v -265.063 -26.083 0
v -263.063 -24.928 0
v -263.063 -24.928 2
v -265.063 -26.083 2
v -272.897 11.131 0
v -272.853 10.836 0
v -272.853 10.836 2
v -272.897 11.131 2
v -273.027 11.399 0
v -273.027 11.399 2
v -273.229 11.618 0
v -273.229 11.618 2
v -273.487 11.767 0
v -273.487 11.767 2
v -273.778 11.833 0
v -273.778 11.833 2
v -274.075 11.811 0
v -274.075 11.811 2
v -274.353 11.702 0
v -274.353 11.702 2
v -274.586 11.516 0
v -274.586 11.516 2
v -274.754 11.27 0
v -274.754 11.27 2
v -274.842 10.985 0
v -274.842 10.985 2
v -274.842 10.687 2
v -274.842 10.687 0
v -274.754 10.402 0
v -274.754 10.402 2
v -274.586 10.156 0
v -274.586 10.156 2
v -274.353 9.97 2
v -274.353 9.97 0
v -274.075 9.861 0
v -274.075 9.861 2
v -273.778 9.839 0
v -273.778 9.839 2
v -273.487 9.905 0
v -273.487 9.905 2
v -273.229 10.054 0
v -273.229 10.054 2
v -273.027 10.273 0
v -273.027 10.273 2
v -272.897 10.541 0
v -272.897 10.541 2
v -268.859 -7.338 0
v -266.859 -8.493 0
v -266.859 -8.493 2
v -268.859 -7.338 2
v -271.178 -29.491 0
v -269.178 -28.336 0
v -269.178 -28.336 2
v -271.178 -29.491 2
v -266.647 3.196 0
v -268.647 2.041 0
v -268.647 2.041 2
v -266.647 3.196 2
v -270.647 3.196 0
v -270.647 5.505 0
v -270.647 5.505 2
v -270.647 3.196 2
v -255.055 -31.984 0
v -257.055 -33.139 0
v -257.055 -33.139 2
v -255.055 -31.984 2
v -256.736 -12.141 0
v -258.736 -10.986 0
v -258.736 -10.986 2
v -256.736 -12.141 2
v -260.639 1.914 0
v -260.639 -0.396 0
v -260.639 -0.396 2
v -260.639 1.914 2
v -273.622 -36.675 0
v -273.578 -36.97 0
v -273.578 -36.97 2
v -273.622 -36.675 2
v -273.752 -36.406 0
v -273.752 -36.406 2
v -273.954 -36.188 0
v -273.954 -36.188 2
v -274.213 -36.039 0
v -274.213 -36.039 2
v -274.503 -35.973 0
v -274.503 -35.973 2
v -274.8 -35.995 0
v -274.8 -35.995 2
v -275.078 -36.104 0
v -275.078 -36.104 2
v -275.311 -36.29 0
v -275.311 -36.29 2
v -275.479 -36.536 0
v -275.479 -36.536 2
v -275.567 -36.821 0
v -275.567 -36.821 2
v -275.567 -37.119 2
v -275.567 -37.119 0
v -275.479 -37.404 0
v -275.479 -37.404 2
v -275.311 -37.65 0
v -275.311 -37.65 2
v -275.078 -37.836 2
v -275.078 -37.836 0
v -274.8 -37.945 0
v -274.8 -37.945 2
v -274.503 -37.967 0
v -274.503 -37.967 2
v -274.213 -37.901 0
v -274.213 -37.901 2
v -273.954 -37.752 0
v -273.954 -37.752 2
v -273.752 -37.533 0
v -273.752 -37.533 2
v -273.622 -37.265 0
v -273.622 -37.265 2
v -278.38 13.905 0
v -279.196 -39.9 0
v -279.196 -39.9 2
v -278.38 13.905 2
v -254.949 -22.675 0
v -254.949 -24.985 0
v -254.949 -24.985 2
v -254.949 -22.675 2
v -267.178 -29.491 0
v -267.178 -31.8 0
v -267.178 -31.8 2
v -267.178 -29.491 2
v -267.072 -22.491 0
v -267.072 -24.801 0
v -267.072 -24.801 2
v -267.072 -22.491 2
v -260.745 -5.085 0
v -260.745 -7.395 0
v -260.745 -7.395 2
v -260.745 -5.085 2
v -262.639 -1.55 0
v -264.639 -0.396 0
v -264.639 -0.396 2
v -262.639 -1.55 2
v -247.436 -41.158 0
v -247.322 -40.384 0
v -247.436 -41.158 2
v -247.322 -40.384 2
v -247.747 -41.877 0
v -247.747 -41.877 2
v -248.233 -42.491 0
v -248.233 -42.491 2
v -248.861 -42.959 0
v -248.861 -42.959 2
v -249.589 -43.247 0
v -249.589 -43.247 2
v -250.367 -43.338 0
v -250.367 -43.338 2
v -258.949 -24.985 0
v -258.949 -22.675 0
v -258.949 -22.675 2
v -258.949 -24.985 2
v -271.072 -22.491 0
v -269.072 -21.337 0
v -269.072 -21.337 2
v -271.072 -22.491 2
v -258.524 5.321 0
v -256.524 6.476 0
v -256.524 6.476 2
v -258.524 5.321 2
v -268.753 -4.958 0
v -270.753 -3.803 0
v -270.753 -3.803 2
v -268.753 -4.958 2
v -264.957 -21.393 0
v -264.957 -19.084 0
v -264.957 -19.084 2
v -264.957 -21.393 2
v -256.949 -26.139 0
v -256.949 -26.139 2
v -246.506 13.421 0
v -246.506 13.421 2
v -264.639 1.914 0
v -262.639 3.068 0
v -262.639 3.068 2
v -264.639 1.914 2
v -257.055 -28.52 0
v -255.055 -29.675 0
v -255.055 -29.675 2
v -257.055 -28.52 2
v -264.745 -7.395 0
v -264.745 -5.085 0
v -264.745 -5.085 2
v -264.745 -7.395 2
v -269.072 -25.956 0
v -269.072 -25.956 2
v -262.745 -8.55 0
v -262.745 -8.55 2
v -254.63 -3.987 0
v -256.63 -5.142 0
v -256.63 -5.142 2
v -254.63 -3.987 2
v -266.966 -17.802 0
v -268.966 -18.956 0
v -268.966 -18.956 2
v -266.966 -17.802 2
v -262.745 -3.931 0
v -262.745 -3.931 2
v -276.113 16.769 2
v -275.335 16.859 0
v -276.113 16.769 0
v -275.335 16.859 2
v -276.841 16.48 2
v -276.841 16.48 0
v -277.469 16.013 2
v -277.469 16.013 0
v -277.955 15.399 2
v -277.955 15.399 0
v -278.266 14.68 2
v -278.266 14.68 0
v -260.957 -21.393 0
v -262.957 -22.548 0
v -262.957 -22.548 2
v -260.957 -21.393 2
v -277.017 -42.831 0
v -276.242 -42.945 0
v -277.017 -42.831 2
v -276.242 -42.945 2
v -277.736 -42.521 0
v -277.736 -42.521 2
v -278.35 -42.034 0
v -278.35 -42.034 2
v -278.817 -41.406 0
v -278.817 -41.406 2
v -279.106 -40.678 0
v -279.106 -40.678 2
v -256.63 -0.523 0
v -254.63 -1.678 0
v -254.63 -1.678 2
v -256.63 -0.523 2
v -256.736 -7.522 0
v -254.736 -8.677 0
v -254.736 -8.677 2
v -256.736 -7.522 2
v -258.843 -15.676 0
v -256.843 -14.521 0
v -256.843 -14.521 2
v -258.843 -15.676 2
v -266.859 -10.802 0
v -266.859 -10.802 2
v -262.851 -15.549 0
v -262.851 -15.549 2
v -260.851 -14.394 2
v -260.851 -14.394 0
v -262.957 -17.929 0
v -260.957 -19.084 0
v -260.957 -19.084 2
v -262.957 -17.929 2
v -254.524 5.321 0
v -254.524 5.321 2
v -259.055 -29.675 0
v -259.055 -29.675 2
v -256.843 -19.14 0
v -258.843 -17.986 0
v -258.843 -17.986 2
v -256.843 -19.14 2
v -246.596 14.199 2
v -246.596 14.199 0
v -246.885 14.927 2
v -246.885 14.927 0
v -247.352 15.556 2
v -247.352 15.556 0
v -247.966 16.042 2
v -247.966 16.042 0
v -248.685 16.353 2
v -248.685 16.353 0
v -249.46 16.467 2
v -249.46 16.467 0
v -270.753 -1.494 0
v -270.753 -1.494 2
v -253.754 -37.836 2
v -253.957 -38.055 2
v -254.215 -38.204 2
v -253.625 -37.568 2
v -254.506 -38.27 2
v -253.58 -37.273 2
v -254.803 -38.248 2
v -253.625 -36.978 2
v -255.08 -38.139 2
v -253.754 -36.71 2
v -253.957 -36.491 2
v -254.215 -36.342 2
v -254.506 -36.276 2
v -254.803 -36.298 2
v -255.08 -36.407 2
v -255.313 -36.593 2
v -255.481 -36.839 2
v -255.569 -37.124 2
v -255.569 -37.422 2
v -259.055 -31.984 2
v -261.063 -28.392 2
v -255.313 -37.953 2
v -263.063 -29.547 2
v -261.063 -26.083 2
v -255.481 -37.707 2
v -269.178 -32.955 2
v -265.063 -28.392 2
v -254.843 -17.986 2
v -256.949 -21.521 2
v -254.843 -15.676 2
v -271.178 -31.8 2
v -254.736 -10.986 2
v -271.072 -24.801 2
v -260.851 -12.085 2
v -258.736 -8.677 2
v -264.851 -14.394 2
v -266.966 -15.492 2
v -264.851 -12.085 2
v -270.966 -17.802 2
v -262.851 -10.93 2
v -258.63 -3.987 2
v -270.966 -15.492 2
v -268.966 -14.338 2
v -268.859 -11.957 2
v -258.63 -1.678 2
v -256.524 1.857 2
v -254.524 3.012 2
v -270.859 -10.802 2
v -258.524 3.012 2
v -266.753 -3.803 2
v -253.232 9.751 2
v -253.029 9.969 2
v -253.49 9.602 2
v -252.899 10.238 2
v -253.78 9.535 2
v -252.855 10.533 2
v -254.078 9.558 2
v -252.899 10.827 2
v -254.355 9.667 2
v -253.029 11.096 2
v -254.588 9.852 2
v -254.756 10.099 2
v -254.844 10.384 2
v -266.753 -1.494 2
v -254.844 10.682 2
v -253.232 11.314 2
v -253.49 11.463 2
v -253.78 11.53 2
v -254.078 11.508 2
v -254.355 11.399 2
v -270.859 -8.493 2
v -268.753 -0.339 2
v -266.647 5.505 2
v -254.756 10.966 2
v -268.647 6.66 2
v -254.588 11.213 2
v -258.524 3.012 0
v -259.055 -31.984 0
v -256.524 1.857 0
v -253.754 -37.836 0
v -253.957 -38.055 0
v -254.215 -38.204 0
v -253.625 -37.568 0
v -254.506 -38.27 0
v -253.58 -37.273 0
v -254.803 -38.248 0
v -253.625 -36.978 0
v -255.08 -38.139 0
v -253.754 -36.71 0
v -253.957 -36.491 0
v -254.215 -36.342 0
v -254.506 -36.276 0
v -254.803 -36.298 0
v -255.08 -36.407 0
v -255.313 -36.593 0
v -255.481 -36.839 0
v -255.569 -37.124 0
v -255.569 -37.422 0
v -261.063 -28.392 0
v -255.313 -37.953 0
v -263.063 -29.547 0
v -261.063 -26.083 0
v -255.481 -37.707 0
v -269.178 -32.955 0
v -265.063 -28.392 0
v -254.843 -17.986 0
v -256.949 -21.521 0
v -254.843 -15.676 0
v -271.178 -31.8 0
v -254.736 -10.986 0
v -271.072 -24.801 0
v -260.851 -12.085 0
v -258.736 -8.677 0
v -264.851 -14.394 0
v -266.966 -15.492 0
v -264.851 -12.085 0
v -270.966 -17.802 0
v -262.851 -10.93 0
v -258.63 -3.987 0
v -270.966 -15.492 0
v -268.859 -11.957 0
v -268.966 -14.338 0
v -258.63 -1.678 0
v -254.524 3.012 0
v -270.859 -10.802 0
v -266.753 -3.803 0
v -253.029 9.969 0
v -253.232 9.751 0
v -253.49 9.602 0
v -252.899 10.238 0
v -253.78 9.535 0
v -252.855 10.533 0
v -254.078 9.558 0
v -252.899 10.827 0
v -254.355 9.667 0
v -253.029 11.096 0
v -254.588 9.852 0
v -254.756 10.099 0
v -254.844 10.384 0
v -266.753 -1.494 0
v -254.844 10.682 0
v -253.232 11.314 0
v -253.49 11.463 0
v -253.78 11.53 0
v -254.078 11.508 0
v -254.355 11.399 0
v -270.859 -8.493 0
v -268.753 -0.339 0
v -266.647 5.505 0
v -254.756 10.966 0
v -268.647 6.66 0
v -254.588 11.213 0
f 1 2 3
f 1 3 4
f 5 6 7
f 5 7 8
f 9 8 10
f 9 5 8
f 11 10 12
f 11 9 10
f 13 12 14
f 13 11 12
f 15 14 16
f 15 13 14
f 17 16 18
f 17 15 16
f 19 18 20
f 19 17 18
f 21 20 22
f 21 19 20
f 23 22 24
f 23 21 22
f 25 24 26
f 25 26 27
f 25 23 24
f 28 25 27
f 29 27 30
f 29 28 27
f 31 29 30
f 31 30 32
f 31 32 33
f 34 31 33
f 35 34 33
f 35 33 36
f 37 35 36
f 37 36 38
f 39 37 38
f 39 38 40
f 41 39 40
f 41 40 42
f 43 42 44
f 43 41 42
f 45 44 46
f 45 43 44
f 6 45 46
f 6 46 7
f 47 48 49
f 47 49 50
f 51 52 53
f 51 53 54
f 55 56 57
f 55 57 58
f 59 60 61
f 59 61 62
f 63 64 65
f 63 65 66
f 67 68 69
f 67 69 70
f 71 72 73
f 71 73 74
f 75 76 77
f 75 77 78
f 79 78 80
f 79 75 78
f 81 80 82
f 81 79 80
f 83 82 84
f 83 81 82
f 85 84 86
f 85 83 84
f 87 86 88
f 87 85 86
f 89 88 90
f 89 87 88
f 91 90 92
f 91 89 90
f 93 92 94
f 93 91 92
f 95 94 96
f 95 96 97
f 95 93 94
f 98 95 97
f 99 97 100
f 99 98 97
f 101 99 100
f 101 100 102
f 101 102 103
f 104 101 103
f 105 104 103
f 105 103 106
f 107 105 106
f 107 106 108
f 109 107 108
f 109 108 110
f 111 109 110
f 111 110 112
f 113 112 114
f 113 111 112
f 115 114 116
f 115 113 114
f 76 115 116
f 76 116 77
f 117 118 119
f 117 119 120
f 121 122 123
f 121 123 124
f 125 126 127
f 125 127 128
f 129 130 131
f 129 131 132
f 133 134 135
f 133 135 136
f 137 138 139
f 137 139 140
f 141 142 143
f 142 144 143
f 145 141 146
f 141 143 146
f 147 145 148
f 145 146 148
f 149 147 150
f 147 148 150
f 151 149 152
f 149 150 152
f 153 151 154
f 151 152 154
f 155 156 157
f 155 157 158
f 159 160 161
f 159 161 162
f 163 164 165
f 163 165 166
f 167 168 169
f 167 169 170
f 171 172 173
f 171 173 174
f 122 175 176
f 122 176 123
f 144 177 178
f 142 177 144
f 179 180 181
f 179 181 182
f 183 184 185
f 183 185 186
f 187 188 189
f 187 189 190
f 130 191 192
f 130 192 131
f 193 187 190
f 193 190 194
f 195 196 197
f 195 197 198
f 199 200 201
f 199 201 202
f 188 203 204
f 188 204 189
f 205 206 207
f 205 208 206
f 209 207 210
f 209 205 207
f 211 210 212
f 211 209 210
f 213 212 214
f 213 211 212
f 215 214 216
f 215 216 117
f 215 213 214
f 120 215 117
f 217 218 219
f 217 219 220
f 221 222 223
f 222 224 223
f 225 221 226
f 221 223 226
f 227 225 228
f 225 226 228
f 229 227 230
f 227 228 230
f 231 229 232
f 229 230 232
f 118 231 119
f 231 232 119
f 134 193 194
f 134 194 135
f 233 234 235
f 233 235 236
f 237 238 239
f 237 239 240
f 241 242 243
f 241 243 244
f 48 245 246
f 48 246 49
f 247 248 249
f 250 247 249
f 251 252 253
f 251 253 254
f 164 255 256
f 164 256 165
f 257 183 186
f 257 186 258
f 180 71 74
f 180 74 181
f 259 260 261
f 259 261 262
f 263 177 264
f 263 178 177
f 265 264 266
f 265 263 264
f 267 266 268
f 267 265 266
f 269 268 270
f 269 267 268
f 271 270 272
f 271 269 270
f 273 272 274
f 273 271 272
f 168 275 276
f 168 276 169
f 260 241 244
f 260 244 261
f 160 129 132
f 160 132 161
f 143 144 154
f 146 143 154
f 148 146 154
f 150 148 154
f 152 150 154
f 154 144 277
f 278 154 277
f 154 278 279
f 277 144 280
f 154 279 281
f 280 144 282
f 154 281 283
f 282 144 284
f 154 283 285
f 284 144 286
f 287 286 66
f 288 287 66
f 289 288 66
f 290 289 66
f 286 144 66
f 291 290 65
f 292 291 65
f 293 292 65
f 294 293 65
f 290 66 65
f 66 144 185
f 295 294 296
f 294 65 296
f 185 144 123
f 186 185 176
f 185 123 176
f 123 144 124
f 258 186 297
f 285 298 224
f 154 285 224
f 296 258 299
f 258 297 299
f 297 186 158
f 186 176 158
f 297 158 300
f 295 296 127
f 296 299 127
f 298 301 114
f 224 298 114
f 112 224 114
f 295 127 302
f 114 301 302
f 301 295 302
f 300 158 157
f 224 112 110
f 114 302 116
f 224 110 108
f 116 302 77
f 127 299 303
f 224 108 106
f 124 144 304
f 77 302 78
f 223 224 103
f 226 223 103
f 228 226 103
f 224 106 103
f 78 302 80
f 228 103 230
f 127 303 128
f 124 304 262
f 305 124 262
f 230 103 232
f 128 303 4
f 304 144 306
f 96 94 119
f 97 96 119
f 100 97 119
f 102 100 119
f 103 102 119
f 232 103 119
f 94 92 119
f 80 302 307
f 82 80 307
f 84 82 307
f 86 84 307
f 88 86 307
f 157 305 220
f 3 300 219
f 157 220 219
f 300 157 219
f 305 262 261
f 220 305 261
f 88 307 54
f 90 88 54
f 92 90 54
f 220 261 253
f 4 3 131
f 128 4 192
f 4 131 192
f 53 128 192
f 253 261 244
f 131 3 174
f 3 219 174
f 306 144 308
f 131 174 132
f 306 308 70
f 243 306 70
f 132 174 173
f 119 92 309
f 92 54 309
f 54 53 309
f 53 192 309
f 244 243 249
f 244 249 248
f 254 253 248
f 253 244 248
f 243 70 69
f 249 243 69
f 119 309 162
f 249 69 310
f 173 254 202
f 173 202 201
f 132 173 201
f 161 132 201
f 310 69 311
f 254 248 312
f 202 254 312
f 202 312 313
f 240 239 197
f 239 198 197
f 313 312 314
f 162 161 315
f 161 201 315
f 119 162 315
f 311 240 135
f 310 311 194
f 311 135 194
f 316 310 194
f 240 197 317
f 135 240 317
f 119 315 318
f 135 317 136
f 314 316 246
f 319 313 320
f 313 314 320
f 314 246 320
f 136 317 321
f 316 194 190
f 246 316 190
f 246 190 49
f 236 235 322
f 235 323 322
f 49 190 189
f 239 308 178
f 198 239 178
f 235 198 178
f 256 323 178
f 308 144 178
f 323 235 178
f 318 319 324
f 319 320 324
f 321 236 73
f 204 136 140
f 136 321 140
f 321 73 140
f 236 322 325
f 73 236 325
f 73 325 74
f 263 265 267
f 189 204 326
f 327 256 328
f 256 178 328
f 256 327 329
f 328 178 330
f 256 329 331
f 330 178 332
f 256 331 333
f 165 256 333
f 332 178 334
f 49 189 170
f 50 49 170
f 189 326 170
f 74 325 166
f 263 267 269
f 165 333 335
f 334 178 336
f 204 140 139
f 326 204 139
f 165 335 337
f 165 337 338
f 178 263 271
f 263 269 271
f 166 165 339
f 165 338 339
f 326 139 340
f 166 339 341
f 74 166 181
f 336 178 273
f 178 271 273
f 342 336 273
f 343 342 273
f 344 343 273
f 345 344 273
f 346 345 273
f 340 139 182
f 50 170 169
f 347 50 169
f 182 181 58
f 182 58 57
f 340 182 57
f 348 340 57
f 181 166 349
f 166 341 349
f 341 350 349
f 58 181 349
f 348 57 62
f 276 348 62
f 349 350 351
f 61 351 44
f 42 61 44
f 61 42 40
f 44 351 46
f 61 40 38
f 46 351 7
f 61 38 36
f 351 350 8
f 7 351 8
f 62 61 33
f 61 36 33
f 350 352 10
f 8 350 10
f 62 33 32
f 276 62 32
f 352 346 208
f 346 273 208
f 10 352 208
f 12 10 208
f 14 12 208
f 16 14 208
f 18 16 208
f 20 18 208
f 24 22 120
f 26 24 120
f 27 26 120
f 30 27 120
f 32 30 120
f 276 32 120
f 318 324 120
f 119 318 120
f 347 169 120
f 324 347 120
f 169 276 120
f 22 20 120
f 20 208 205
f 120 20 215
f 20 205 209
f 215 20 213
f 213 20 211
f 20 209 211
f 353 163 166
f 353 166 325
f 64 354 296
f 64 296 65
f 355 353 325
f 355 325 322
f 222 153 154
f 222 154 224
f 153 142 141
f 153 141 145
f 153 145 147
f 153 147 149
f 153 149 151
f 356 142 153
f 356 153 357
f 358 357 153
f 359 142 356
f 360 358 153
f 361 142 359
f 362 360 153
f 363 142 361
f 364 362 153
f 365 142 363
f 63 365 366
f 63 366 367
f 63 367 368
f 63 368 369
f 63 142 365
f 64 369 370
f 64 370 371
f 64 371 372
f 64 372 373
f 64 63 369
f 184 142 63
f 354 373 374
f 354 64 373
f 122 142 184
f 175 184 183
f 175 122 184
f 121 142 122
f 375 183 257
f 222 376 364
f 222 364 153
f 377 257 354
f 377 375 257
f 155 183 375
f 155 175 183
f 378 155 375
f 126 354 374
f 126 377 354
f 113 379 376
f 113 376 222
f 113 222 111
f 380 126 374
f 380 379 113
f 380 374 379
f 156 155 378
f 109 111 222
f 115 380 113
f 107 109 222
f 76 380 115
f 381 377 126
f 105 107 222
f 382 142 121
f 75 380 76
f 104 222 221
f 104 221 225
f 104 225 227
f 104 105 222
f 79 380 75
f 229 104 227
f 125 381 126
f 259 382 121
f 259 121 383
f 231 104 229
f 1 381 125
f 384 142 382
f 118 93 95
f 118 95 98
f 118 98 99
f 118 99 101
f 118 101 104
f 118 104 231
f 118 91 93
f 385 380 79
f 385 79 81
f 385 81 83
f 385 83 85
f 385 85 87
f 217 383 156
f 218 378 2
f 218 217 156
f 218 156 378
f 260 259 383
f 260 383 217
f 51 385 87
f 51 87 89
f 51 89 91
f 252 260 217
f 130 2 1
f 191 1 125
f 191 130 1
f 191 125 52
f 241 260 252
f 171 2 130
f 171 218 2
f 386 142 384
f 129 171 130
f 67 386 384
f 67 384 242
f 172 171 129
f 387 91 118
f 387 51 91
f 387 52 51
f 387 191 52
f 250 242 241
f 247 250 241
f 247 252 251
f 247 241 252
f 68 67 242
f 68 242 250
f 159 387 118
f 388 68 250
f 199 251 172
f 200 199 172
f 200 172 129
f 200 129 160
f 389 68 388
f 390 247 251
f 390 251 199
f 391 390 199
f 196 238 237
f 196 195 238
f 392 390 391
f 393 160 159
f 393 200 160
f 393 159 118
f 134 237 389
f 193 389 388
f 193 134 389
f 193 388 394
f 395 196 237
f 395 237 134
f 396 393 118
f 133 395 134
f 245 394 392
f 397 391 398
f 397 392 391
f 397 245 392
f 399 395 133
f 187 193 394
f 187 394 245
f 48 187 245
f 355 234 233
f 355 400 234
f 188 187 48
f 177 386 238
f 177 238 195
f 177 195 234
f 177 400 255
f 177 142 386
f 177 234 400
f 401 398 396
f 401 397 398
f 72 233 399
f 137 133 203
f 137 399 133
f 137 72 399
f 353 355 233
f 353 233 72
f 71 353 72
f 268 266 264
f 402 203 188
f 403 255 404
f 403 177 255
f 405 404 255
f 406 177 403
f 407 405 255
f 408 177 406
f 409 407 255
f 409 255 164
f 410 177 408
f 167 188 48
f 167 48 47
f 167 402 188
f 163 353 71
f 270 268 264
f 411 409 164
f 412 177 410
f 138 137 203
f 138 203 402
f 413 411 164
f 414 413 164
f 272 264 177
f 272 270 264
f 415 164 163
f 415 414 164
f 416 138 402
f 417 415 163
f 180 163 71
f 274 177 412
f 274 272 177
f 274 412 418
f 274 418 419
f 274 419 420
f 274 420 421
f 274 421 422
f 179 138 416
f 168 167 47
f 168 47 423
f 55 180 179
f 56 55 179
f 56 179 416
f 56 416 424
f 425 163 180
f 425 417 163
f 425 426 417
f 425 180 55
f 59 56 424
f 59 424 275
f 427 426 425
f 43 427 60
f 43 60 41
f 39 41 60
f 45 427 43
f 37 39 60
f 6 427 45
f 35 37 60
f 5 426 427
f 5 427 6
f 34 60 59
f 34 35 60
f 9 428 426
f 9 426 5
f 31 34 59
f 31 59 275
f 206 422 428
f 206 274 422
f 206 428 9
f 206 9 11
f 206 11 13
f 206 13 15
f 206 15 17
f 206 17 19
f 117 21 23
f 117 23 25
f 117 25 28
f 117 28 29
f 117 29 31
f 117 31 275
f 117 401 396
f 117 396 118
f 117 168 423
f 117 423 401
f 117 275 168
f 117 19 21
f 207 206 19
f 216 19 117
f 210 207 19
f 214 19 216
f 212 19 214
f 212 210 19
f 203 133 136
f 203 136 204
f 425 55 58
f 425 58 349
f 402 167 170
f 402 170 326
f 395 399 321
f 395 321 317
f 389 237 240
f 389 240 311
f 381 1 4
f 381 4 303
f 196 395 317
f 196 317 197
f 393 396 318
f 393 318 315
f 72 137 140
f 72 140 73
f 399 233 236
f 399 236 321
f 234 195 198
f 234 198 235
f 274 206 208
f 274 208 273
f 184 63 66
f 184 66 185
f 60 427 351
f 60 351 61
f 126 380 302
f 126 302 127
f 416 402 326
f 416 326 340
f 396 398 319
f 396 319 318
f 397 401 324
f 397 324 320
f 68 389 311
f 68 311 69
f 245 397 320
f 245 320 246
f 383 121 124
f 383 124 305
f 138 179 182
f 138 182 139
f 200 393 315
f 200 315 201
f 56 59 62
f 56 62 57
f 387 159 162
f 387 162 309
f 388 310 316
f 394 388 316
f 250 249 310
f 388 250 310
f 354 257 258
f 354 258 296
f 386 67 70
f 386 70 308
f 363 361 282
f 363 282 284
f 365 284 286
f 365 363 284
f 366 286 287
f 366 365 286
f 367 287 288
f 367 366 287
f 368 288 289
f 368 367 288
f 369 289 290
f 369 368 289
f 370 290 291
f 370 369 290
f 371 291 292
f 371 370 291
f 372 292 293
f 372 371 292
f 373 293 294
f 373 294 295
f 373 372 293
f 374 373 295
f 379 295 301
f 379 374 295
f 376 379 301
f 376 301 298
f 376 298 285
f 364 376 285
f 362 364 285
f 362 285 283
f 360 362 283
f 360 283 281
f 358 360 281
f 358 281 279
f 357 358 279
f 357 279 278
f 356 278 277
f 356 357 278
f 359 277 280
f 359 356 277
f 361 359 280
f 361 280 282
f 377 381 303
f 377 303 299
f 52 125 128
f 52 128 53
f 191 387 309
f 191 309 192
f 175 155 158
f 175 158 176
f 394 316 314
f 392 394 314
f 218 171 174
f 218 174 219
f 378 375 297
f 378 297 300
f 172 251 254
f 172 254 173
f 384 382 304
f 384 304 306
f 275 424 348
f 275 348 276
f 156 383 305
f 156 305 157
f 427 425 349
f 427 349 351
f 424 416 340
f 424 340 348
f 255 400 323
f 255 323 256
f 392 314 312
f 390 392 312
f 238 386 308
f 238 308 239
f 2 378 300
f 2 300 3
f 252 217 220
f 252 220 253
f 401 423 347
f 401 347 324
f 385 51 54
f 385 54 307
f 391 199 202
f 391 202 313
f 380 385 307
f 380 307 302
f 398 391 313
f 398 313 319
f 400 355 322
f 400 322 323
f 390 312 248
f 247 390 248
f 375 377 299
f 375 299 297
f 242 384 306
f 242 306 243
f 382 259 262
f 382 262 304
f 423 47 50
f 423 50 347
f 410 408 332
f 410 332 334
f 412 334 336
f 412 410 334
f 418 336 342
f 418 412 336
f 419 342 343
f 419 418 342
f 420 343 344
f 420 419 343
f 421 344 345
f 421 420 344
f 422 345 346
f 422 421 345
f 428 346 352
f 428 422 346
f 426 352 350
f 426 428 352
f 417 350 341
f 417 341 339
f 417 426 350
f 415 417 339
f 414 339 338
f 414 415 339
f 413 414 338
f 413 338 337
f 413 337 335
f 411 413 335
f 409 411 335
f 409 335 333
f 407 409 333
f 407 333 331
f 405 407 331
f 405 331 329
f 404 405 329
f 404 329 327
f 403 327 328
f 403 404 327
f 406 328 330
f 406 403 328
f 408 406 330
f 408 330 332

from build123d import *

# Parameters (mm, degrees)
SKETCH_1_R          = 1
EXTRUDE_1_DEPTH     = 2
FILLET_1_R          = 3
CUT_EXTRUDE_1_DEPTH = 10
OTHER_1_DEPTH       = 2


# Read off the part's stored shape, not the designer's step: 填充阵列1
with BuildPart() as part:
    # 草图1 → 凸台-拉伸1 (new body)
    with BuildSketch(Plane.XY):
        Polygon((-246.460434143, 16.421045692), (-247.367512812, -43.383226063), (-279.241752663, -42.899690556), (-278.334515728, 16.904578798), align=None)
        with Locations((-273.852745372, 10.835899523)):
            Circle(SKETCH_1_R, mode=Mode.SUBTRACT)
        with Locations((-253.855045493, 10.532585287)):
            Circle(SKETCH_1_R, mode=Mode.SUBTRACT)
        with Locations((-254.580263739, -37.273170465)):
            Circle(SKETCH_1_R, mode=Mode.SUBTRACT)
        with Locations((-274.577962013, -36.969750385)):
            Circle(SKETCH_1_R, mode=Mode.SUBTRACT)
    extrude(amount=EXTRUDE_1_DEPTH)

    # 圆角1
    fillet_1_edges = [part.edges().sort_by_distance(p)[0] for p in [
        (-246.460434143, 16.421045692, 1),
        (-247.367512812, -43.383226063, 1),
        (-279.241752663, -42.899690556, 1),
        (-278.334515728, 16.904578798, 1),
    ]]
    fillet(fillet_1_edges, radius=FILLET_1_R)

    # 草图2 → 切除-拉伸1 (cut)
    with BuildSketch(Plane.XY.offset(2)):
        Polygon((-260.851053776, -13.269658771), (-264.851053776, -13.208979355), (-264.851053776, -14.394019601), (-262.851053776, -15.54872014), (-260.851053776, -14.394019601), align=None)
        Polygon((-264.851053776, -12.084618525), (-264.851053776, -13.208979355), (-260.851053776, -13.269658771), (-260.851053776, -12.084618525), (-262.851053776, -10.929917986), align=None)
    extrude(amount=-CUT_EXTRUDE_1_DEPTH, mode=Mode.SUBTRACT)

    # 填充阵列1 outline → 填充阵列1 (cut)
    with BuildSketch(Plane.XY):
        Polygon((-258.52417318, 5.321431628), (-258.52417318, 3.012030551), (-256.52417318, 1.857330013), (-254.52417318, 3.012030551), (-254.52417318, 5.321431628), (-256.52417318, 6.476132167), align=None)
        Polygon((-271.07177439, -22.49147372), (-271.07177439, -24.800874796), (-269.07177439, -25.955575335), (-267.07177439, -24.800874796), (-267.07177439, -22.49147372), (-269.07177439, -21.336773181), align=None)
        Polygon((-258.94881311, -22.675348203), (-258.94881311, -24.98474928), (-256.94881311, -26.139449818), (-254.94881311, -24.98474928), (-254.94881311, -22.675348203), (-256.94881311, -21.520647665), align=None)
        Polygon((-264.957213759, -19.083813483), (-264.957213759, -21.393214559), (-262.957213759, -22.547915098), (-260.957213759, -21.393214559), (-260.957213759, -19.083813483), (-262.957213759, -17.929112944), align=None)
        Polygon((-270.965614407, -15.492278762), (-270.965614407, -17.801679839), (-268.965614407, -18.956380377), (-266.965614407, -17.801679839), (-266.965614407, -15.492278762), (-268.965614407, -14.337578223), align=None)
        Polygon((-265.063373741, -26.08300844), (-265.063373741, -28.392409517), (-263.063373741, -29.547110056), (-261.063373741, -28.392409517), (-261.063373741, -26.08300844), (-263.063373741, -24.928307902), align=None)
        Polygon((-259.054973093, -29.674543161), (-259.054973093, -31.983944238), (-257.054973093, -33.138644776), (-255.054973093, -31.983944238), (-255.054973093, -29.674543161), (-257.054973093, -28.519842623), align=None)
        Polygon((-271.177934372, -29.490668678), (-271.177934372, -31.800069754), (-269.177934372, -32.954770293), (-267.177934372, -31.800069754), (-267.177934372, -29.490668678), (-269.177934372, -28.335968139), align=None)
        Polygon((-270.753294442, -1.493888846), (-270.753294442, -3.803289923), (-268.753294442, -4.957990461), (-266.753294442, -3.803289923), (-266.753294442, -1.493888846), (-268.753294442, -0.339188308), align=None)
        Polygon((-258.630333163, -1.67776333), (-258.630333163, -3.987164406), (-256.630333163, -5.141864945), (-254.630333163, -3.987164406), (-254.630333163, -1.67776333), (-256.630333163, -0.523062791), align=None)
        Polygon((-264.638733811, 1.913771391), (-264.638733811, -0.395629686), (-262.638733811, -1.550330224), (-260.638733811, -0.395629686), (-260.638733811, 1.913771391), (-262.638733811, 3.068471929), align=None)
        Polygon((-270.647134459, 5.505306112), (-270.647134459, 3.195905035), (-268.647134459, 2.041204497), (-266.647134459, 3.195905035), (-266.647134459, 5.505306112), (-268.647134459, 6.66000665), align=None)
        Polygon((-258.842653128, -15.676153245), (-258.842653128, -17.985554322), (-256.842653128, -19.14025486), (-254.842653128, -17.985554322), (-254.842653128, -15.676153245), (-256.842653128, -14.521452707), align=None)
        Polygon((-270.859454424, -8.493083804), (-270.859454424, -10.802484881), (-268.859454424, -11.957185419), (-266.859454424, -10.802484881), (-266.859454424, -8.493083804), (-268.859454424, -7.338383266), align=None)
        Polygon((-258.736493145, -8.676958287), (-258.736493145, -10.986359364), (-256.736493145, -12.141059903), (-254.736493145, -10.986359364), (-254.736493145, -8.676958287), (-256.736493145, -7.522257749), align=None)
        Polygon((-264.744893794, -5.085423567), (-264.744893794, -7.394824644), (-262.744893794, -8.549525182), (-260.744893794, -7.394824644), (-260.744893794, -5.085423567), (-262.744893794, -3.930723028), align=None)
    extrude(amount=OTHER_1_DEPTH, mode=Mode.SUBTRACT)


solid = part.part
